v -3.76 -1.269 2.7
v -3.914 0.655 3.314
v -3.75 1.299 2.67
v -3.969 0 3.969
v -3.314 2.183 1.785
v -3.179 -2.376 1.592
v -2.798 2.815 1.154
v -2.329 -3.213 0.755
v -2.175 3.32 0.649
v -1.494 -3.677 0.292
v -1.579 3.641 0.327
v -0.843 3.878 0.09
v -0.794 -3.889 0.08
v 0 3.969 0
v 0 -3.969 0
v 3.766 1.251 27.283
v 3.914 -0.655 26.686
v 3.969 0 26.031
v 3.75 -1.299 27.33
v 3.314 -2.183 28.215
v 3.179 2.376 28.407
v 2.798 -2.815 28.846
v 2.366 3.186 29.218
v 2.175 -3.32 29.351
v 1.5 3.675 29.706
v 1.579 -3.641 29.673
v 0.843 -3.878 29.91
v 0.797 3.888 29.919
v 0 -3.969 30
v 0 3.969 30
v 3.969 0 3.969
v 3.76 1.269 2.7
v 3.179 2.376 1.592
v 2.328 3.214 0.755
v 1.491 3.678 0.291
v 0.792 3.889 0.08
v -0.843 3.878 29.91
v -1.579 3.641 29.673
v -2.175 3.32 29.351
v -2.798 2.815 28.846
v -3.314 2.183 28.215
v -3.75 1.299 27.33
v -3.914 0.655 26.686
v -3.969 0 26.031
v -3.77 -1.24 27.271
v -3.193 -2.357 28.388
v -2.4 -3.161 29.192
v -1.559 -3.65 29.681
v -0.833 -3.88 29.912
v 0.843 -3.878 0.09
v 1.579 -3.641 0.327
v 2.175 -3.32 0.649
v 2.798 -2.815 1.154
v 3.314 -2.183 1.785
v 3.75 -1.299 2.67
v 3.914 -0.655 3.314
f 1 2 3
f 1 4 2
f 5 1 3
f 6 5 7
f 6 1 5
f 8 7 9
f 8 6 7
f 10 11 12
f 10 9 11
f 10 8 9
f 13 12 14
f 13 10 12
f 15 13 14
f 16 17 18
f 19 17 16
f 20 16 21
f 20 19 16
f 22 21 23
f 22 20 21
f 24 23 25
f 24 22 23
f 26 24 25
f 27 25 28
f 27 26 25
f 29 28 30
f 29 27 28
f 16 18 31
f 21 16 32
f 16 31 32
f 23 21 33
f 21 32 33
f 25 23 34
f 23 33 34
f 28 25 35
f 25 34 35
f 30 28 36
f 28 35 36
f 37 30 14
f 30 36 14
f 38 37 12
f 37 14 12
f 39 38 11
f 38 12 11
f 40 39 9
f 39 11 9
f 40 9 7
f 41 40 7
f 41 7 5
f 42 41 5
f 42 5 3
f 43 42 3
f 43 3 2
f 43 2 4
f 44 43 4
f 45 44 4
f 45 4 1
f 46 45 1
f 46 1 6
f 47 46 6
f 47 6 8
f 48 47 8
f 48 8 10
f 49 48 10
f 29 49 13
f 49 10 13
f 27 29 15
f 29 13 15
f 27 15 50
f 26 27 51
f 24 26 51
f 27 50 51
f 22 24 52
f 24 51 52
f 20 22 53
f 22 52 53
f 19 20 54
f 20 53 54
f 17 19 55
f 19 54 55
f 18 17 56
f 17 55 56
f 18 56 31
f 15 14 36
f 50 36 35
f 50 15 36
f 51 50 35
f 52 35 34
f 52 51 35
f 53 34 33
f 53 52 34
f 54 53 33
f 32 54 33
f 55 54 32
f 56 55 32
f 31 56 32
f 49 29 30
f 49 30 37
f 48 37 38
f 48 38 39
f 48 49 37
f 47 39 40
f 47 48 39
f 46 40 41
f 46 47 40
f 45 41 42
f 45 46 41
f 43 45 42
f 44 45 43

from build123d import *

# Parameters (mm, degrees)
SKETCH1_R               = 3.96875
BOSS_EXTRUDE1_DEPTH     = 30
CUT_EXTRUDE1_DEPTH      = 31.520516921
CUT_EXTRUDE1_DEPTH_BACK = 31.520516921
CUT_EXTRUDE2_DEPTH      = 31.520516921
CUT_EXTRUDE2_DEPTH_BACK = 31.520516921


with BuildPart() as part:
    # Sketch1 → Boss-Extrude1 (new body)
    with BuildSketch(Plane.XY):
        Circle(SKETCH1_R)
    extrude(amount=BOSS_EXTRUDE1_DEPTH)

    # Sketch2 → Cut-Extrude1 (cut, two sides: drawn at the far end of the back side and taken through both)
    with BuildSketch(Plane(origin=(0, 0, 0), x_dir=(1, 0, 0), z_dir=(0, 1, 0)).offset(-CUT_EXTRUDE1_DEPTH_BACK)):
        with BuildLine():
            ThreePointArc((0, -30), (-2.806330038, -28.837580038), (-3.96875, -26.03125))
            Line((-3.96875, -26.03125), (-3.96875, -30))
            Line((-3.96875, -30), (0, -30))
        make_face()
        with BuildLine():
            Line((3.96875, -30), (3.96875, -26.03125))
            ThreePointArc((3.96875, -26.03125), (2.806330038, -28.837580038), (0, -30))
            Line((0, -30), (3.96875, -30))
        make_face()
    extrude(amount=CUT_EXTRUDE1_DEPTH + CUT_EXTRUDE1_DEPTH_BACK, mode=Mode.SUBTRACT)

    # Sketch3 → Cut-Extrude2 (cut, two sides: drawn at the far end of the back side and taken through both)
    with BuildSketch(Plane(origin=(0, 0, 0), x_dir=(1, 0, 0), z_dir=(0, 1, 0)).offset(-CUT_EXTRUDE2_DEPTH_BACK)):
        with BuildLine():
            ThreePointArc((0, 0), (2.806330038, -1.162419962), (3.96875, -3.96875))
            Line((3.96875, -3.96875), (3.96875, 0))
            Line((3.96875, 0), (0, 0))
        make_face()
        with BuildLine():
            Line((-3.96875, 0), (-3.96875, -3.96875))
            ThreePointArc((-3.96875, -3.96875), (-2.806330038, -1.162419962), (0, 0))
            Line((0, 0), (-3.96875, 0))
        make_face()
    extrude(amount=CUT_EXTRUDE2_DEPTH + CUT_EXTRUDE2_DEPTH_BACK, mode=Mode.SUBTRACT)


solid = part.part
